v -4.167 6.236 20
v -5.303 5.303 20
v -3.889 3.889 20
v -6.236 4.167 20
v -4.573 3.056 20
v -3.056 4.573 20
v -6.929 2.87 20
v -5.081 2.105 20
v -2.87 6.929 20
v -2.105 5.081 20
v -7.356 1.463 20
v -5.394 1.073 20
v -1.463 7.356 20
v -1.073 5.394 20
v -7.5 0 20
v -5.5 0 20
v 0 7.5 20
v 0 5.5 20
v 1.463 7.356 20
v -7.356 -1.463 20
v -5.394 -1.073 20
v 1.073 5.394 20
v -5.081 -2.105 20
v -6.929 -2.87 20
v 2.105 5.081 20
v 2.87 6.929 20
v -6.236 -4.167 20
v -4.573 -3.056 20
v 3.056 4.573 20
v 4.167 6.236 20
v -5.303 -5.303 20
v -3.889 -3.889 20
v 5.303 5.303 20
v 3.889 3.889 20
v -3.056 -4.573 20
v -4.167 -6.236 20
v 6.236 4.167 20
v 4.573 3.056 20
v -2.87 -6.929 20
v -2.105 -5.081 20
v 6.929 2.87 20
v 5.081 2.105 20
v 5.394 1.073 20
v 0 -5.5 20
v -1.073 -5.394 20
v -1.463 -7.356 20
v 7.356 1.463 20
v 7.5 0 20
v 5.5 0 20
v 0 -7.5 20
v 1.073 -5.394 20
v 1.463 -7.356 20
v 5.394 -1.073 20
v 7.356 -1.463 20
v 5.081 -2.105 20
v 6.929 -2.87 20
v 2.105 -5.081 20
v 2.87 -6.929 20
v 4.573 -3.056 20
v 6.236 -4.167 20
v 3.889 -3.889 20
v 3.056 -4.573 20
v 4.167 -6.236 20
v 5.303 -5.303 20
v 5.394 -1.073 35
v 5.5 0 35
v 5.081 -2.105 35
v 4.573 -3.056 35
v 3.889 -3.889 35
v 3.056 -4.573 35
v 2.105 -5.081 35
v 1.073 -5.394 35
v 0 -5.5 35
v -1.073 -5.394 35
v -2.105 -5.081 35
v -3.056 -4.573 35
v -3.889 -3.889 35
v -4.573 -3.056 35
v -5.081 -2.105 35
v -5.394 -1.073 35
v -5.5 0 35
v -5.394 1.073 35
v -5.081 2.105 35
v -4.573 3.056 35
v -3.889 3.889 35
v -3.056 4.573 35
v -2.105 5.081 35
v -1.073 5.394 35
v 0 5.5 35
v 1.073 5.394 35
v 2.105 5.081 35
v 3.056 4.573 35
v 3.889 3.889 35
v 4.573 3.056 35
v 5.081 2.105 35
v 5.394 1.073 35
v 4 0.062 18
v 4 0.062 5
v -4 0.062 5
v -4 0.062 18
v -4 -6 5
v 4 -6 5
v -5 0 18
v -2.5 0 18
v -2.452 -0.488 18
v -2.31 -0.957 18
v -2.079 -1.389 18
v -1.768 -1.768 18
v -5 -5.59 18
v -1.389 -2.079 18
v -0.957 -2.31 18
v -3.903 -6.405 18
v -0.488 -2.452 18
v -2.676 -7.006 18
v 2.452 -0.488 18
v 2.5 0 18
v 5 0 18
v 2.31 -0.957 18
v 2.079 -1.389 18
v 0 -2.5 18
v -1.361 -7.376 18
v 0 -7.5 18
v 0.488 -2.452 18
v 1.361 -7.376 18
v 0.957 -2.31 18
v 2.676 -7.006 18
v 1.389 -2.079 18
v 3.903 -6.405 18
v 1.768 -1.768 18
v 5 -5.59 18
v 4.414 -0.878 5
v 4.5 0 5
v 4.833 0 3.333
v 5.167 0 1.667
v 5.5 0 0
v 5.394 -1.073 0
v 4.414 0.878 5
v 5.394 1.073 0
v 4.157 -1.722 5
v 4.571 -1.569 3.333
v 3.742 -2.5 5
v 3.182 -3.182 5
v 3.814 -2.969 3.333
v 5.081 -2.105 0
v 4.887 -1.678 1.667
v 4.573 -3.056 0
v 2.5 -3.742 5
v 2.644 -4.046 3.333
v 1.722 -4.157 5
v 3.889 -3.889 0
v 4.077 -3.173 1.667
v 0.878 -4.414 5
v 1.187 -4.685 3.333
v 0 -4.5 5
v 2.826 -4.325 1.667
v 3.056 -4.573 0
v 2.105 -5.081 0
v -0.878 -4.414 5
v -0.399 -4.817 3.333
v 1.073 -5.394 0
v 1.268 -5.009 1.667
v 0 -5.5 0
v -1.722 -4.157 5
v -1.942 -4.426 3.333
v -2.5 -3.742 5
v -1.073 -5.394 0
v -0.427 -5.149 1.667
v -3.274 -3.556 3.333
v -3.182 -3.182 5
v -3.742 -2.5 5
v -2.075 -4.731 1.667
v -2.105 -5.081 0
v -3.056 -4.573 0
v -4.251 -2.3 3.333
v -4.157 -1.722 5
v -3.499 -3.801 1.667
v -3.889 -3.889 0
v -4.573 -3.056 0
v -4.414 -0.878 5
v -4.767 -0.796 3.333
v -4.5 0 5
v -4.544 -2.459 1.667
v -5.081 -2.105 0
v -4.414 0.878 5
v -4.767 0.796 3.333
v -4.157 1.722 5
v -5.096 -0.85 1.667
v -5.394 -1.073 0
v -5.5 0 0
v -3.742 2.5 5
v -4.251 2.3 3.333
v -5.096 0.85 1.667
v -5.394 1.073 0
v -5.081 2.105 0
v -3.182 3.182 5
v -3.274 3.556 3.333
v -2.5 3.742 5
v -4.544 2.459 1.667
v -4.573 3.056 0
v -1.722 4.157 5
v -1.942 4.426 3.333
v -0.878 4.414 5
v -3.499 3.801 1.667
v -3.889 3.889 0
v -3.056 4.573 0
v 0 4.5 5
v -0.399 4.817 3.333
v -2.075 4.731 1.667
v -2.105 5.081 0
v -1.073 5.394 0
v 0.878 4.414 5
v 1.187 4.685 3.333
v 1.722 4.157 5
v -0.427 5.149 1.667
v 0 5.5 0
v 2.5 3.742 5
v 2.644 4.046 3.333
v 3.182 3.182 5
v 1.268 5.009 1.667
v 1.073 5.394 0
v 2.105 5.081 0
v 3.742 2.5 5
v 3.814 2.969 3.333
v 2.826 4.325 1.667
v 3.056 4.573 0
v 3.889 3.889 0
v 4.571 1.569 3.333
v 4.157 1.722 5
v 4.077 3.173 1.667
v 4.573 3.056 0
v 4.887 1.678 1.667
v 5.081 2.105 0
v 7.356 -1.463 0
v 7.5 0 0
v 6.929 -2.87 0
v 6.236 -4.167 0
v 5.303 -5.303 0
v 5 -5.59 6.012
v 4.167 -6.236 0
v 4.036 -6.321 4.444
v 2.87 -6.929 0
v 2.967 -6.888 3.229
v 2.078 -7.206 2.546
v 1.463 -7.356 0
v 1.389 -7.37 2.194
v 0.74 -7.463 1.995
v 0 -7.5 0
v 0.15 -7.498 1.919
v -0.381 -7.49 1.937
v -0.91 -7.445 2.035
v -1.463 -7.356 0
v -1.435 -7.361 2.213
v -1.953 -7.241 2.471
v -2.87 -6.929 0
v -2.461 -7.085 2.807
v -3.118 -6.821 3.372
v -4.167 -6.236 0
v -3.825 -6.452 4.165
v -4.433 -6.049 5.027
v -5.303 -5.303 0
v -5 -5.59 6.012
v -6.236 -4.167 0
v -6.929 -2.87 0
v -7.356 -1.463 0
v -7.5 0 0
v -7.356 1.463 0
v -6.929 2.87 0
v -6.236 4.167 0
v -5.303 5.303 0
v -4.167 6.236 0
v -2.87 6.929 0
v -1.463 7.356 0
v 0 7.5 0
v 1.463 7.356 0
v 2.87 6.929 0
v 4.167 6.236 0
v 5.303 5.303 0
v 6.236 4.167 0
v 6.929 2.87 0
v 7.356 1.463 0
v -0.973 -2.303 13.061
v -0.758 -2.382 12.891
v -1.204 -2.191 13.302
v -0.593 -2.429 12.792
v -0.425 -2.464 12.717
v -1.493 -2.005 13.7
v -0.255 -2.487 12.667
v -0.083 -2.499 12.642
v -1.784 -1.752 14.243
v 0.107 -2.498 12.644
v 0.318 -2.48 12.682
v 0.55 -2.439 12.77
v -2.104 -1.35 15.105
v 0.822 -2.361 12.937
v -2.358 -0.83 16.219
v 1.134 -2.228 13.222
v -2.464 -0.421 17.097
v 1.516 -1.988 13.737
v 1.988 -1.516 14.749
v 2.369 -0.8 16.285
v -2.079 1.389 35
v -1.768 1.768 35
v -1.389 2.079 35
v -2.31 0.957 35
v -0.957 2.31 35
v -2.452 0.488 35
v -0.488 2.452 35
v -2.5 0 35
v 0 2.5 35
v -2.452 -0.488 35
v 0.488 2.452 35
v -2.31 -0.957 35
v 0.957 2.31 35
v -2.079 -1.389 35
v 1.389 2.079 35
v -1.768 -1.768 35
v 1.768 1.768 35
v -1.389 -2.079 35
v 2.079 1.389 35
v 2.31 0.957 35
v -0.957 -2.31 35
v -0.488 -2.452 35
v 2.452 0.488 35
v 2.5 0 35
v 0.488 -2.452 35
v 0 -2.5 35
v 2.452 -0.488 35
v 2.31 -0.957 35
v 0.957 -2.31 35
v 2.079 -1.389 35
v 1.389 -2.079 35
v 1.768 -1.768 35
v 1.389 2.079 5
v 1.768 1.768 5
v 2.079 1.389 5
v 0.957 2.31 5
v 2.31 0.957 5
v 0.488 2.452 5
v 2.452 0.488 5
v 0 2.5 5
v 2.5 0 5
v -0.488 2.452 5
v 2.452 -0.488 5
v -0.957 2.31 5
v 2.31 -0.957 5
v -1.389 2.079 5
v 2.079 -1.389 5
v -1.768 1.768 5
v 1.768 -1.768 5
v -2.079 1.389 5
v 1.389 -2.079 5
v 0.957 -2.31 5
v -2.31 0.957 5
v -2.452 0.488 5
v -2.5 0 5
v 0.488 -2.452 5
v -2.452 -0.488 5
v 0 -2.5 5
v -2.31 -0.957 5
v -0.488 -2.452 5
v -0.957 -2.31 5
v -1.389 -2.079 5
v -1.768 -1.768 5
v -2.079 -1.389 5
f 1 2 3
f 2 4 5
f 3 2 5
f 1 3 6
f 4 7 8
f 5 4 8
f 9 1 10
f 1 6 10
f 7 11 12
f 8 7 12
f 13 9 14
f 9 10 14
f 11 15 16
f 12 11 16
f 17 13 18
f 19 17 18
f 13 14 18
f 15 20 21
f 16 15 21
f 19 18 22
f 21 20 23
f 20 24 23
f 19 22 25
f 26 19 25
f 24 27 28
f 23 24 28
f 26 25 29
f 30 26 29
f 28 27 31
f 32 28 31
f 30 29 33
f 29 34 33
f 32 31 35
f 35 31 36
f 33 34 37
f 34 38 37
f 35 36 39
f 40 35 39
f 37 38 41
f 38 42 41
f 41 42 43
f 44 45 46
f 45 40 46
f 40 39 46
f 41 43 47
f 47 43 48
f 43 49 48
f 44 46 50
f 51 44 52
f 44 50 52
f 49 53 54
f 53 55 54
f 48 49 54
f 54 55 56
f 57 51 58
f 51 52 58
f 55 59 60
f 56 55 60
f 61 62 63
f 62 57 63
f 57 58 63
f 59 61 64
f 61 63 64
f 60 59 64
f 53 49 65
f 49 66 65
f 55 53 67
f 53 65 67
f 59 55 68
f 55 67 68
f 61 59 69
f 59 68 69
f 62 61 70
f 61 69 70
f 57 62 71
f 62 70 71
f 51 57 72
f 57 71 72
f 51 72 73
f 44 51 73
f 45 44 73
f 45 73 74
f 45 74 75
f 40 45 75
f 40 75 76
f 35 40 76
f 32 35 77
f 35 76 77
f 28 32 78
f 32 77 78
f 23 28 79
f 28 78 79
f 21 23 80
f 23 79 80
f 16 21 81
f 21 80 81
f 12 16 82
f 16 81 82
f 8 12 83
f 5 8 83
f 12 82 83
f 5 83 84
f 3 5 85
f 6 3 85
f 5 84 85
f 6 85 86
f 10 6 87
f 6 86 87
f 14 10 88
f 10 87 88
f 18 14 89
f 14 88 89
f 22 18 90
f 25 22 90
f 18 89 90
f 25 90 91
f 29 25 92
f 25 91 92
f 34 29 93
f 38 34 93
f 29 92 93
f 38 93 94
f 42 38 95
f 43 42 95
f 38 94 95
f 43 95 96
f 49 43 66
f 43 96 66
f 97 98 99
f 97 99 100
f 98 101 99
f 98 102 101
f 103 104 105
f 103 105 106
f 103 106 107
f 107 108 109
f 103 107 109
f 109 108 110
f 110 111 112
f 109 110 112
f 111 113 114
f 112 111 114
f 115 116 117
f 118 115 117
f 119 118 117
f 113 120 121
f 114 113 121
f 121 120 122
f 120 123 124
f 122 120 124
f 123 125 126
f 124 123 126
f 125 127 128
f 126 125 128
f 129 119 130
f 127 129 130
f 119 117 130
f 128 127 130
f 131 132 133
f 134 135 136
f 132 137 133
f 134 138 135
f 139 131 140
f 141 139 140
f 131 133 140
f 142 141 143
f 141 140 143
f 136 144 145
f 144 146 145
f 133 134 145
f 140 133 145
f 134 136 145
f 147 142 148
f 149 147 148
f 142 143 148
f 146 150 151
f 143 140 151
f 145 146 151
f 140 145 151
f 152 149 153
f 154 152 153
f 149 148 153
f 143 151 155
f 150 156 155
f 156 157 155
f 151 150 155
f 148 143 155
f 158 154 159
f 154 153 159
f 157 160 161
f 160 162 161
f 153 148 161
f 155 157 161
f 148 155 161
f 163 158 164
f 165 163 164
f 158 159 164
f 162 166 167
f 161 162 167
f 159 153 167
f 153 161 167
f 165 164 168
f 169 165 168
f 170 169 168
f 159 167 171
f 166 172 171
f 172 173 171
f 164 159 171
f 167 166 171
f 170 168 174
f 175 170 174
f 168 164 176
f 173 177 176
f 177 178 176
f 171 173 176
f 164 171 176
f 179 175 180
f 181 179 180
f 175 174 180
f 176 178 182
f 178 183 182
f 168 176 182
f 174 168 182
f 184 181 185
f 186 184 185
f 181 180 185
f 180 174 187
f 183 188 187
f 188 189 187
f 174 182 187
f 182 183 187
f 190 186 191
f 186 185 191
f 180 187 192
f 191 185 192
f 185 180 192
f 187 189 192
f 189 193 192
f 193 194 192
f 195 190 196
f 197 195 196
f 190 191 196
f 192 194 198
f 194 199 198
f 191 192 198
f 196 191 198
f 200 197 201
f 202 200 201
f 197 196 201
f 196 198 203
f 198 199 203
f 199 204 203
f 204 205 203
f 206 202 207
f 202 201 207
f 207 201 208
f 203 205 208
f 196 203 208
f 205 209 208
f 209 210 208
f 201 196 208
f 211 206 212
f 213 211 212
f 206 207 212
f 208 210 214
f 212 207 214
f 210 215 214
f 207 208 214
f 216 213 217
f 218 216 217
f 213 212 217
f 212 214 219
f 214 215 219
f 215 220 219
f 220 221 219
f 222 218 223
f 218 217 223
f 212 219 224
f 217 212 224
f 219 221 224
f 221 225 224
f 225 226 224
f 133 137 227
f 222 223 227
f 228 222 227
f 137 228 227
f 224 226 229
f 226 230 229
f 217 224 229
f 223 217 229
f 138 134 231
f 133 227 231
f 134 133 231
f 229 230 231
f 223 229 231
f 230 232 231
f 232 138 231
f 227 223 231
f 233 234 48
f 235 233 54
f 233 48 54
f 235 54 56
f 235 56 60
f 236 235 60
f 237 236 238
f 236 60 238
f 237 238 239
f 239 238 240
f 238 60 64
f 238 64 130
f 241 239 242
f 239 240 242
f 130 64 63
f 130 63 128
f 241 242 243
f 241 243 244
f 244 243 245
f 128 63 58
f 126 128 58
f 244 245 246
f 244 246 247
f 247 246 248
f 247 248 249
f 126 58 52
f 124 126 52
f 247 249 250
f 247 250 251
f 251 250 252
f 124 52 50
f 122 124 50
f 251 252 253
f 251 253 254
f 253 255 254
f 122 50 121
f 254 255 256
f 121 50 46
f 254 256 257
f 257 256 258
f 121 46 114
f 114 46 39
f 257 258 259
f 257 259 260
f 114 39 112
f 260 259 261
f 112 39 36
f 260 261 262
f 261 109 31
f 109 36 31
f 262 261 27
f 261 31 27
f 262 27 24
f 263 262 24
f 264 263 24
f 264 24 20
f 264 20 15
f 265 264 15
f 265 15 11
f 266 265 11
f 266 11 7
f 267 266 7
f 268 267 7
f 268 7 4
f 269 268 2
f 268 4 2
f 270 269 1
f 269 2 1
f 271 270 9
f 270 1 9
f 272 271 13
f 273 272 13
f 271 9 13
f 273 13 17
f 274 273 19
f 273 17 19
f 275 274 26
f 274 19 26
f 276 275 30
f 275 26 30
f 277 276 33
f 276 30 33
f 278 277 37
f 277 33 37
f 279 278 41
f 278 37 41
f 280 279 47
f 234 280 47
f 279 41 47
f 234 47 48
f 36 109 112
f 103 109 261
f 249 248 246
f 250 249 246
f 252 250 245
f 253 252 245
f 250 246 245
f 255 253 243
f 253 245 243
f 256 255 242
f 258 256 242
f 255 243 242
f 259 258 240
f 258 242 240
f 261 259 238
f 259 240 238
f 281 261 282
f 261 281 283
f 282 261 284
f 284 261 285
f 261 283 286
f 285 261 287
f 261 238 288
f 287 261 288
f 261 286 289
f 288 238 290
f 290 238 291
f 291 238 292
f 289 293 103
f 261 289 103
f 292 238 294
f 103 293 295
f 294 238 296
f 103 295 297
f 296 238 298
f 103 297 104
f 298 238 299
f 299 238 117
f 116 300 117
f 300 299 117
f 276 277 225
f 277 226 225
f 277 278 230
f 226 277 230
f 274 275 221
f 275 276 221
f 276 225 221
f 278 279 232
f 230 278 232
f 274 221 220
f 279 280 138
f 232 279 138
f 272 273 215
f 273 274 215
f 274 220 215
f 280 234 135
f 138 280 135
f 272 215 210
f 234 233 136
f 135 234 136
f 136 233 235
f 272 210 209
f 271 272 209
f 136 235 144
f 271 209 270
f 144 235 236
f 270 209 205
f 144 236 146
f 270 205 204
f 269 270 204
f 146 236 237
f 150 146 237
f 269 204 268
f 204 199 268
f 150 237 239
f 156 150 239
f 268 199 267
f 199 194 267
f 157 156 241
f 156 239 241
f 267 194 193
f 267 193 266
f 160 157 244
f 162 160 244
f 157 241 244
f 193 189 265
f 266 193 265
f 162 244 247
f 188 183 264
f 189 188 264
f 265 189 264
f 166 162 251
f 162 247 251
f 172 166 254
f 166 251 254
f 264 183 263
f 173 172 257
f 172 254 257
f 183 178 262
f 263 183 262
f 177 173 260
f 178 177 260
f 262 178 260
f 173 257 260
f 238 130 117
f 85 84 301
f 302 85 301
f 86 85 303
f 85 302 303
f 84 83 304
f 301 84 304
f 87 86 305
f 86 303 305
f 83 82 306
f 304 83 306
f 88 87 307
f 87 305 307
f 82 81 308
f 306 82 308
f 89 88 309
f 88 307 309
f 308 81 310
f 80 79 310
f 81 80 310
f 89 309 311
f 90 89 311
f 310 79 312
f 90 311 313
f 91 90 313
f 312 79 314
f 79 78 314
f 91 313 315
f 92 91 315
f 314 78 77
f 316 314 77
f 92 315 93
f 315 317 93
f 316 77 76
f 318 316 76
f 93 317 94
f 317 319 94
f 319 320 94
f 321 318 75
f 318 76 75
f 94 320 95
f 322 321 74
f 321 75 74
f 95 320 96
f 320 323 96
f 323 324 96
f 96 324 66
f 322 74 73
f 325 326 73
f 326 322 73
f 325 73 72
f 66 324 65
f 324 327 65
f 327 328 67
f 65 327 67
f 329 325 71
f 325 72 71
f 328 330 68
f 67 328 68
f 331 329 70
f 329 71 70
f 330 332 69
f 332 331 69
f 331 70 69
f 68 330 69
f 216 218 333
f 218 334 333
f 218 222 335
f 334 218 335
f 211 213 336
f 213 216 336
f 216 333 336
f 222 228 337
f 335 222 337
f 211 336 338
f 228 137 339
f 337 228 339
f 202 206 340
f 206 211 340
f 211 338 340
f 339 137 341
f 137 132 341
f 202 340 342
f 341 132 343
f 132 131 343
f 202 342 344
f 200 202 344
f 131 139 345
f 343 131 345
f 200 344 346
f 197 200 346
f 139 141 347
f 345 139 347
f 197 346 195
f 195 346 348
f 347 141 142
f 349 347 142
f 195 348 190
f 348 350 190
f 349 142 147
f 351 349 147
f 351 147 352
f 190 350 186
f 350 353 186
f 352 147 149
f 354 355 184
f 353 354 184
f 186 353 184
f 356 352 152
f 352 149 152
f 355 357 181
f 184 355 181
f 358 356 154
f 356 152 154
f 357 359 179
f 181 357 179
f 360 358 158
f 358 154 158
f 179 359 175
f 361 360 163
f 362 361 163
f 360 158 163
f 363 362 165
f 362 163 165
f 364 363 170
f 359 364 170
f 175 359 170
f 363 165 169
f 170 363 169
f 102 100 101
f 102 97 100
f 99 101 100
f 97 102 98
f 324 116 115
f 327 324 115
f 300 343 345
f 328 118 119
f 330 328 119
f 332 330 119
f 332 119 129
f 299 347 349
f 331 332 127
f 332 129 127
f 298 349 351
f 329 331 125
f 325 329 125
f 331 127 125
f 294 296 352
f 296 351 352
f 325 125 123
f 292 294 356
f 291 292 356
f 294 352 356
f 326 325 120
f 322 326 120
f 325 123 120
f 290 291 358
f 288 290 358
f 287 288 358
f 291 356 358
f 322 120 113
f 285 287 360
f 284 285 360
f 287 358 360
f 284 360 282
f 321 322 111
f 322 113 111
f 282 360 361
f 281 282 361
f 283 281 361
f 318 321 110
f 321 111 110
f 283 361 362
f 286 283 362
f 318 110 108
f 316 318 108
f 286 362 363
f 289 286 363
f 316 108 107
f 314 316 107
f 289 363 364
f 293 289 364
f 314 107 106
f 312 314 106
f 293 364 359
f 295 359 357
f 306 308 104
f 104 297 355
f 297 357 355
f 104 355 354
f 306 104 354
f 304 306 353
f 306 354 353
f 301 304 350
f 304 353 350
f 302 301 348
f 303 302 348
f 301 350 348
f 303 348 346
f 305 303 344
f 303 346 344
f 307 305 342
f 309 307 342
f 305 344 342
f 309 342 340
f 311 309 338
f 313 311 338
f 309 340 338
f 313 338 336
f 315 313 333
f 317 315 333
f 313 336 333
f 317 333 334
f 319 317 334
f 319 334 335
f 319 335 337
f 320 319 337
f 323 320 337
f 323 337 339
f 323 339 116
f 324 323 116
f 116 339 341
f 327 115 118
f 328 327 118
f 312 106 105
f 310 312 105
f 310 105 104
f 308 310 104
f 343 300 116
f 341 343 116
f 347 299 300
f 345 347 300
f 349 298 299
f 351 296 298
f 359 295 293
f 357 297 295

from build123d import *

# Parameters (mm, degrees)
F3_DEPTH = 5
F5_DEPTH = 4


with BuildPart() as f1:
    # F0 (on Front) → F1 (revolve)
    with BuildSketch(Plane.XZ):
        Polygon((5.5, 0), (7.5, 0), (7.5, 20), (5.5, 20), (5.5, 35), (2.5, 35), (2.5, 5), (4.5, 5), align=None)
    revolve(axis=Axis((0, 0, 9.491472), (0, 0, -1)))

    # F2 (on Right) → F3 (cut, symmetric)
    with BuildSketch(Plane.YZ):
        Polygon((-10.691921, 18), (-10.691921, -4.928898), (0, 18), align=None)
    extrude(amount=F3_DEPTH, both=True, mode=Mode.SUBTRACT)


with BuildPart() as f5:
    # F4 (on Right) → F5 (new body, symmetric)
    with BuildSketch(Plane.YZ):
        Polygon((-5.999954, 4.999613), (0.062226, 4.999613), (0.062226, 18), align=None)
    extrude(amount=F5_DEPTH, both=True)


solid = Compound([f1.part, f5.part])
